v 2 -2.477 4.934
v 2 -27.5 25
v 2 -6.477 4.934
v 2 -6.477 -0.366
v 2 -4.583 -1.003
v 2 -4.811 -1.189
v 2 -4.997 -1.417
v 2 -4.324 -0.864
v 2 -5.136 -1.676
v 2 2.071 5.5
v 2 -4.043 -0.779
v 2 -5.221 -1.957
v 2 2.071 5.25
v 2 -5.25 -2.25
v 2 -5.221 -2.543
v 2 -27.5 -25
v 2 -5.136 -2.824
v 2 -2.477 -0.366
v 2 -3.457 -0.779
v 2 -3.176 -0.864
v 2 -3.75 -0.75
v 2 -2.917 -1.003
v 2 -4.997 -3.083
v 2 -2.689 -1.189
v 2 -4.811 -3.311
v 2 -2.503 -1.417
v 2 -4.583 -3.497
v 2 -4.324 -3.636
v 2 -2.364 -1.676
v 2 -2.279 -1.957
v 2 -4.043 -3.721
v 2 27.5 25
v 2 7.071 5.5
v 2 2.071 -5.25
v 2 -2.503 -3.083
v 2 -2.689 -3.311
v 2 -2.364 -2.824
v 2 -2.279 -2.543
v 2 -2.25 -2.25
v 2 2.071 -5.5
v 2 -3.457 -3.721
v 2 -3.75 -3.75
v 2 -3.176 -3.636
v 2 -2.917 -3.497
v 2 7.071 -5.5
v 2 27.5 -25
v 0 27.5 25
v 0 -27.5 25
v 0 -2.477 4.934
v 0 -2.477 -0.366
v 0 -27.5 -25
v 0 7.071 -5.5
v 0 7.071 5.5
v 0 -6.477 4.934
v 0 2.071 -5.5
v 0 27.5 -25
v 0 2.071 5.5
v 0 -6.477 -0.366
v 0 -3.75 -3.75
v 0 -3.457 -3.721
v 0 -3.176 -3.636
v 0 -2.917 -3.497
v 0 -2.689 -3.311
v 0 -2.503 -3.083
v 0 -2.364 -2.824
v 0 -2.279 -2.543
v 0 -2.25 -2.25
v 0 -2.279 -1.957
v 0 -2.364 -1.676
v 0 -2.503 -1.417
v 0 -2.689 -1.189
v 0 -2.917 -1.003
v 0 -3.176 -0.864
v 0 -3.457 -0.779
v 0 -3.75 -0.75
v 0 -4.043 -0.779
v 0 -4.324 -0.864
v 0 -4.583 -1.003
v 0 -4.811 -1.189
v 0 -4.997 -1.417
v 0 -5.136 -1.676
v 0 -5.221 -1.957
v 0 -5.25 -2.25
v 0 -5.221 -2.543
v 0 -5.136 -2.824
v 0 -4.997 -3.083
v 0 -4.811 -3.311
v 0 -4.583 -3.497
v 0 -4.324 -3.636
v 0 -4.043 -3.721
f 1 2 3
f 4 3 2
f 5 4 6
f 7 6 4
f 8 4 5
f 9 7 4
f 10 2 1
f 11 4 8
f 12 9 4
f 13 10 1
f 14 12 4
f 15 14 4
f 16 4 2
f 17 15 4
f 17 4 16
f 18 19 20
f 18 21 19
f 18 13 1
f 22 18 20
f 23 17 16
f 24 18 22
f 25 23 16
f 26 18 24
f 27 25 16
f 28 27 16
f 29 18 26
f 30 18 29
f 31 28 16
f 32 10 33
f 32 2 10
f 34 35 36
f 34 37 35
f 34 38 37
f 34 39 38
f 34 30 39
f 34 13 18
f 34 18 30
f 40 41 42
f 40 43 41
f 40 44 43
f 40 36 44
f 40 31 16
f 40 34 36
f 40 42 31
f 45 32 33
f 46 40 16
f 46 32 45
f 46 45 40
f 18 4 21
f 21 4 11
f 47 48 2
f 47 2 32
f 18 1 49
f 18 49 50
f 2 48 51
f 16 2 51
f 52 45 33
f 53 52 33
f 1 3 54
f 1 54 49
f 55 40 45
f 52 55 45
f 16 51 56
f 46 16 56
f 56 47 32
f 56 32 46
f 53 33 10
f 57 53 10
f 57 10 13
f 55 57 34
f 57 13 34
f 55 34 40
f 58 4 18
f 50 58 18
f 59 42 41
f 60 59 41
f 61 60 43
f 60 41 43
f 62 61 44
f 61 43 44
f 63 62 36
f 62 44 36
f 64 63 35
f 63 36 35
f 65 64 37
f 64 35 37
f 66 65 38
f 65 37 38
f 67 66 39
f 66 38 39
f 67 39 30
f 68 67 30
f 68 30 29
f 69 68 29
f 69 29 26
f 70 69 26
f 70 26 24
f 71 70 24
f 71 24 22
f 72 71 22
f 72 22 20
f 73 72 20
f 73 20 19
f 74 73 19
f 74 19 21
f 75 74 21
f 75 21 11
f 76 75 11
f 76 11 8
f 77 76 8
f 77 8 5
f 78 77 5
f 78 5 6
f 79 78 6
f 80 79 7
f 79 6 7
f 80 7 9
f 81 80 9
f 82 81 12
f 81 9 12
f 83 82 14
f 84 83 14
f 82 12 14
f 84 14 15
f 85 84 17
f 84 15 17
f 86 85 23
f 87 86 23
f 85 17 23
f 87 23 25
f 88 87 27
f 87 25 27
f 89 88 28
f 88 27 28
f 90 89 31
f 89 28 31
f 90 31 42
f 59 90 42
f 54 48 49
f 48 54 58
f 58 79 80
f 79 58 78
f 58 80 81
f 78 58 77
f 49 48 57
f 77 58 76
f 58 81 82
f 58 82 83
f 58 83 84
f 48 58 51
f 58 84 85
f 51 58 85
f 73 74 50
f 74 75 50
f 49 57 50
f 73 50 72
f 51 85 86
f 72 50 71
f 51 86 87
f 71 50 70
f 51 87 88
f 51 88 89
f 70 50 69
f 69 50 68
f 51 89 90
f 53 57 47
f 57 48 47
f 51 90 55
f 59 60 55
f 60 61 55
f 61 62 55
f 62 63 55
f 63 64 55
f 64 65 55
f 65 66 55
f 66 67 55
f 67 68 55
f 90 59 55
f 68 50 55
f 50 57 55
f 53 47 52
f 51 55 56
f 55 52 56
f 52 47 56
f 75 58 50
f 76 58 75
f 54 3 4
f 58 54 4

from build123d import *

# Parameters (mm, degrees)
SKETCH1_W           = 50
SKETCH1_H           = 55
BOSS_EXTRUDE1_DEPTH = 2
SKETCH2_W           = 5.3
SKETCH2_H           = 4
SKETCH2_R           = 1.5
SKETCH2_W_2         = 10.5
SKETCH2_H_2         = 4.678571429
CUT_EXTRUDE1_DEPTH  = 10


with BuildPart() as part:
    # Sketch1 → Boss-Extrude1 (new body)
    with BuildSketch(Plane(origin=(0, 0, 0), x_dir=(0, 0, -1), z_dir=(1, 0, 0))):
        Rectangle(SKETCH1_W, SKETCH1_H)
    extrude(amount=BOSS_EXTRUDE1_DEPTH)

    # Sketch2 → Cut-Extrude1 (cut)
    with BuildSketch(Plane(origin=(2, 0, 0), x_dir=(0, 0, -1), z_dir=(1, 0, 0))):
        with Locations((-2.284317843, -4.476763319)):
            Rectangle(SKETCH2_W, SKETCH2_H)
        with Locations((2.25, -3.75)):
            Circle(SKETCH2_R)
        Polygon((5.25, 6.75), (5.25, 2.071428571), (5.5, 2.071428571), (5.5, 7.071428571), (-5.5, 7.071428571), (-5.5, 2.071428571), (-5.25, 2.071428571), (-5.25, 6.75), align=None)
        with Locations((0, 4.410714286)):
            Rectangle(SKETCH2_W_2, SKETCH2_H_2)
    extrude(amount=-CUT_EXTRUDE1_DEPTH, mode=Mode.SUBTRACT)


solid = part.part
